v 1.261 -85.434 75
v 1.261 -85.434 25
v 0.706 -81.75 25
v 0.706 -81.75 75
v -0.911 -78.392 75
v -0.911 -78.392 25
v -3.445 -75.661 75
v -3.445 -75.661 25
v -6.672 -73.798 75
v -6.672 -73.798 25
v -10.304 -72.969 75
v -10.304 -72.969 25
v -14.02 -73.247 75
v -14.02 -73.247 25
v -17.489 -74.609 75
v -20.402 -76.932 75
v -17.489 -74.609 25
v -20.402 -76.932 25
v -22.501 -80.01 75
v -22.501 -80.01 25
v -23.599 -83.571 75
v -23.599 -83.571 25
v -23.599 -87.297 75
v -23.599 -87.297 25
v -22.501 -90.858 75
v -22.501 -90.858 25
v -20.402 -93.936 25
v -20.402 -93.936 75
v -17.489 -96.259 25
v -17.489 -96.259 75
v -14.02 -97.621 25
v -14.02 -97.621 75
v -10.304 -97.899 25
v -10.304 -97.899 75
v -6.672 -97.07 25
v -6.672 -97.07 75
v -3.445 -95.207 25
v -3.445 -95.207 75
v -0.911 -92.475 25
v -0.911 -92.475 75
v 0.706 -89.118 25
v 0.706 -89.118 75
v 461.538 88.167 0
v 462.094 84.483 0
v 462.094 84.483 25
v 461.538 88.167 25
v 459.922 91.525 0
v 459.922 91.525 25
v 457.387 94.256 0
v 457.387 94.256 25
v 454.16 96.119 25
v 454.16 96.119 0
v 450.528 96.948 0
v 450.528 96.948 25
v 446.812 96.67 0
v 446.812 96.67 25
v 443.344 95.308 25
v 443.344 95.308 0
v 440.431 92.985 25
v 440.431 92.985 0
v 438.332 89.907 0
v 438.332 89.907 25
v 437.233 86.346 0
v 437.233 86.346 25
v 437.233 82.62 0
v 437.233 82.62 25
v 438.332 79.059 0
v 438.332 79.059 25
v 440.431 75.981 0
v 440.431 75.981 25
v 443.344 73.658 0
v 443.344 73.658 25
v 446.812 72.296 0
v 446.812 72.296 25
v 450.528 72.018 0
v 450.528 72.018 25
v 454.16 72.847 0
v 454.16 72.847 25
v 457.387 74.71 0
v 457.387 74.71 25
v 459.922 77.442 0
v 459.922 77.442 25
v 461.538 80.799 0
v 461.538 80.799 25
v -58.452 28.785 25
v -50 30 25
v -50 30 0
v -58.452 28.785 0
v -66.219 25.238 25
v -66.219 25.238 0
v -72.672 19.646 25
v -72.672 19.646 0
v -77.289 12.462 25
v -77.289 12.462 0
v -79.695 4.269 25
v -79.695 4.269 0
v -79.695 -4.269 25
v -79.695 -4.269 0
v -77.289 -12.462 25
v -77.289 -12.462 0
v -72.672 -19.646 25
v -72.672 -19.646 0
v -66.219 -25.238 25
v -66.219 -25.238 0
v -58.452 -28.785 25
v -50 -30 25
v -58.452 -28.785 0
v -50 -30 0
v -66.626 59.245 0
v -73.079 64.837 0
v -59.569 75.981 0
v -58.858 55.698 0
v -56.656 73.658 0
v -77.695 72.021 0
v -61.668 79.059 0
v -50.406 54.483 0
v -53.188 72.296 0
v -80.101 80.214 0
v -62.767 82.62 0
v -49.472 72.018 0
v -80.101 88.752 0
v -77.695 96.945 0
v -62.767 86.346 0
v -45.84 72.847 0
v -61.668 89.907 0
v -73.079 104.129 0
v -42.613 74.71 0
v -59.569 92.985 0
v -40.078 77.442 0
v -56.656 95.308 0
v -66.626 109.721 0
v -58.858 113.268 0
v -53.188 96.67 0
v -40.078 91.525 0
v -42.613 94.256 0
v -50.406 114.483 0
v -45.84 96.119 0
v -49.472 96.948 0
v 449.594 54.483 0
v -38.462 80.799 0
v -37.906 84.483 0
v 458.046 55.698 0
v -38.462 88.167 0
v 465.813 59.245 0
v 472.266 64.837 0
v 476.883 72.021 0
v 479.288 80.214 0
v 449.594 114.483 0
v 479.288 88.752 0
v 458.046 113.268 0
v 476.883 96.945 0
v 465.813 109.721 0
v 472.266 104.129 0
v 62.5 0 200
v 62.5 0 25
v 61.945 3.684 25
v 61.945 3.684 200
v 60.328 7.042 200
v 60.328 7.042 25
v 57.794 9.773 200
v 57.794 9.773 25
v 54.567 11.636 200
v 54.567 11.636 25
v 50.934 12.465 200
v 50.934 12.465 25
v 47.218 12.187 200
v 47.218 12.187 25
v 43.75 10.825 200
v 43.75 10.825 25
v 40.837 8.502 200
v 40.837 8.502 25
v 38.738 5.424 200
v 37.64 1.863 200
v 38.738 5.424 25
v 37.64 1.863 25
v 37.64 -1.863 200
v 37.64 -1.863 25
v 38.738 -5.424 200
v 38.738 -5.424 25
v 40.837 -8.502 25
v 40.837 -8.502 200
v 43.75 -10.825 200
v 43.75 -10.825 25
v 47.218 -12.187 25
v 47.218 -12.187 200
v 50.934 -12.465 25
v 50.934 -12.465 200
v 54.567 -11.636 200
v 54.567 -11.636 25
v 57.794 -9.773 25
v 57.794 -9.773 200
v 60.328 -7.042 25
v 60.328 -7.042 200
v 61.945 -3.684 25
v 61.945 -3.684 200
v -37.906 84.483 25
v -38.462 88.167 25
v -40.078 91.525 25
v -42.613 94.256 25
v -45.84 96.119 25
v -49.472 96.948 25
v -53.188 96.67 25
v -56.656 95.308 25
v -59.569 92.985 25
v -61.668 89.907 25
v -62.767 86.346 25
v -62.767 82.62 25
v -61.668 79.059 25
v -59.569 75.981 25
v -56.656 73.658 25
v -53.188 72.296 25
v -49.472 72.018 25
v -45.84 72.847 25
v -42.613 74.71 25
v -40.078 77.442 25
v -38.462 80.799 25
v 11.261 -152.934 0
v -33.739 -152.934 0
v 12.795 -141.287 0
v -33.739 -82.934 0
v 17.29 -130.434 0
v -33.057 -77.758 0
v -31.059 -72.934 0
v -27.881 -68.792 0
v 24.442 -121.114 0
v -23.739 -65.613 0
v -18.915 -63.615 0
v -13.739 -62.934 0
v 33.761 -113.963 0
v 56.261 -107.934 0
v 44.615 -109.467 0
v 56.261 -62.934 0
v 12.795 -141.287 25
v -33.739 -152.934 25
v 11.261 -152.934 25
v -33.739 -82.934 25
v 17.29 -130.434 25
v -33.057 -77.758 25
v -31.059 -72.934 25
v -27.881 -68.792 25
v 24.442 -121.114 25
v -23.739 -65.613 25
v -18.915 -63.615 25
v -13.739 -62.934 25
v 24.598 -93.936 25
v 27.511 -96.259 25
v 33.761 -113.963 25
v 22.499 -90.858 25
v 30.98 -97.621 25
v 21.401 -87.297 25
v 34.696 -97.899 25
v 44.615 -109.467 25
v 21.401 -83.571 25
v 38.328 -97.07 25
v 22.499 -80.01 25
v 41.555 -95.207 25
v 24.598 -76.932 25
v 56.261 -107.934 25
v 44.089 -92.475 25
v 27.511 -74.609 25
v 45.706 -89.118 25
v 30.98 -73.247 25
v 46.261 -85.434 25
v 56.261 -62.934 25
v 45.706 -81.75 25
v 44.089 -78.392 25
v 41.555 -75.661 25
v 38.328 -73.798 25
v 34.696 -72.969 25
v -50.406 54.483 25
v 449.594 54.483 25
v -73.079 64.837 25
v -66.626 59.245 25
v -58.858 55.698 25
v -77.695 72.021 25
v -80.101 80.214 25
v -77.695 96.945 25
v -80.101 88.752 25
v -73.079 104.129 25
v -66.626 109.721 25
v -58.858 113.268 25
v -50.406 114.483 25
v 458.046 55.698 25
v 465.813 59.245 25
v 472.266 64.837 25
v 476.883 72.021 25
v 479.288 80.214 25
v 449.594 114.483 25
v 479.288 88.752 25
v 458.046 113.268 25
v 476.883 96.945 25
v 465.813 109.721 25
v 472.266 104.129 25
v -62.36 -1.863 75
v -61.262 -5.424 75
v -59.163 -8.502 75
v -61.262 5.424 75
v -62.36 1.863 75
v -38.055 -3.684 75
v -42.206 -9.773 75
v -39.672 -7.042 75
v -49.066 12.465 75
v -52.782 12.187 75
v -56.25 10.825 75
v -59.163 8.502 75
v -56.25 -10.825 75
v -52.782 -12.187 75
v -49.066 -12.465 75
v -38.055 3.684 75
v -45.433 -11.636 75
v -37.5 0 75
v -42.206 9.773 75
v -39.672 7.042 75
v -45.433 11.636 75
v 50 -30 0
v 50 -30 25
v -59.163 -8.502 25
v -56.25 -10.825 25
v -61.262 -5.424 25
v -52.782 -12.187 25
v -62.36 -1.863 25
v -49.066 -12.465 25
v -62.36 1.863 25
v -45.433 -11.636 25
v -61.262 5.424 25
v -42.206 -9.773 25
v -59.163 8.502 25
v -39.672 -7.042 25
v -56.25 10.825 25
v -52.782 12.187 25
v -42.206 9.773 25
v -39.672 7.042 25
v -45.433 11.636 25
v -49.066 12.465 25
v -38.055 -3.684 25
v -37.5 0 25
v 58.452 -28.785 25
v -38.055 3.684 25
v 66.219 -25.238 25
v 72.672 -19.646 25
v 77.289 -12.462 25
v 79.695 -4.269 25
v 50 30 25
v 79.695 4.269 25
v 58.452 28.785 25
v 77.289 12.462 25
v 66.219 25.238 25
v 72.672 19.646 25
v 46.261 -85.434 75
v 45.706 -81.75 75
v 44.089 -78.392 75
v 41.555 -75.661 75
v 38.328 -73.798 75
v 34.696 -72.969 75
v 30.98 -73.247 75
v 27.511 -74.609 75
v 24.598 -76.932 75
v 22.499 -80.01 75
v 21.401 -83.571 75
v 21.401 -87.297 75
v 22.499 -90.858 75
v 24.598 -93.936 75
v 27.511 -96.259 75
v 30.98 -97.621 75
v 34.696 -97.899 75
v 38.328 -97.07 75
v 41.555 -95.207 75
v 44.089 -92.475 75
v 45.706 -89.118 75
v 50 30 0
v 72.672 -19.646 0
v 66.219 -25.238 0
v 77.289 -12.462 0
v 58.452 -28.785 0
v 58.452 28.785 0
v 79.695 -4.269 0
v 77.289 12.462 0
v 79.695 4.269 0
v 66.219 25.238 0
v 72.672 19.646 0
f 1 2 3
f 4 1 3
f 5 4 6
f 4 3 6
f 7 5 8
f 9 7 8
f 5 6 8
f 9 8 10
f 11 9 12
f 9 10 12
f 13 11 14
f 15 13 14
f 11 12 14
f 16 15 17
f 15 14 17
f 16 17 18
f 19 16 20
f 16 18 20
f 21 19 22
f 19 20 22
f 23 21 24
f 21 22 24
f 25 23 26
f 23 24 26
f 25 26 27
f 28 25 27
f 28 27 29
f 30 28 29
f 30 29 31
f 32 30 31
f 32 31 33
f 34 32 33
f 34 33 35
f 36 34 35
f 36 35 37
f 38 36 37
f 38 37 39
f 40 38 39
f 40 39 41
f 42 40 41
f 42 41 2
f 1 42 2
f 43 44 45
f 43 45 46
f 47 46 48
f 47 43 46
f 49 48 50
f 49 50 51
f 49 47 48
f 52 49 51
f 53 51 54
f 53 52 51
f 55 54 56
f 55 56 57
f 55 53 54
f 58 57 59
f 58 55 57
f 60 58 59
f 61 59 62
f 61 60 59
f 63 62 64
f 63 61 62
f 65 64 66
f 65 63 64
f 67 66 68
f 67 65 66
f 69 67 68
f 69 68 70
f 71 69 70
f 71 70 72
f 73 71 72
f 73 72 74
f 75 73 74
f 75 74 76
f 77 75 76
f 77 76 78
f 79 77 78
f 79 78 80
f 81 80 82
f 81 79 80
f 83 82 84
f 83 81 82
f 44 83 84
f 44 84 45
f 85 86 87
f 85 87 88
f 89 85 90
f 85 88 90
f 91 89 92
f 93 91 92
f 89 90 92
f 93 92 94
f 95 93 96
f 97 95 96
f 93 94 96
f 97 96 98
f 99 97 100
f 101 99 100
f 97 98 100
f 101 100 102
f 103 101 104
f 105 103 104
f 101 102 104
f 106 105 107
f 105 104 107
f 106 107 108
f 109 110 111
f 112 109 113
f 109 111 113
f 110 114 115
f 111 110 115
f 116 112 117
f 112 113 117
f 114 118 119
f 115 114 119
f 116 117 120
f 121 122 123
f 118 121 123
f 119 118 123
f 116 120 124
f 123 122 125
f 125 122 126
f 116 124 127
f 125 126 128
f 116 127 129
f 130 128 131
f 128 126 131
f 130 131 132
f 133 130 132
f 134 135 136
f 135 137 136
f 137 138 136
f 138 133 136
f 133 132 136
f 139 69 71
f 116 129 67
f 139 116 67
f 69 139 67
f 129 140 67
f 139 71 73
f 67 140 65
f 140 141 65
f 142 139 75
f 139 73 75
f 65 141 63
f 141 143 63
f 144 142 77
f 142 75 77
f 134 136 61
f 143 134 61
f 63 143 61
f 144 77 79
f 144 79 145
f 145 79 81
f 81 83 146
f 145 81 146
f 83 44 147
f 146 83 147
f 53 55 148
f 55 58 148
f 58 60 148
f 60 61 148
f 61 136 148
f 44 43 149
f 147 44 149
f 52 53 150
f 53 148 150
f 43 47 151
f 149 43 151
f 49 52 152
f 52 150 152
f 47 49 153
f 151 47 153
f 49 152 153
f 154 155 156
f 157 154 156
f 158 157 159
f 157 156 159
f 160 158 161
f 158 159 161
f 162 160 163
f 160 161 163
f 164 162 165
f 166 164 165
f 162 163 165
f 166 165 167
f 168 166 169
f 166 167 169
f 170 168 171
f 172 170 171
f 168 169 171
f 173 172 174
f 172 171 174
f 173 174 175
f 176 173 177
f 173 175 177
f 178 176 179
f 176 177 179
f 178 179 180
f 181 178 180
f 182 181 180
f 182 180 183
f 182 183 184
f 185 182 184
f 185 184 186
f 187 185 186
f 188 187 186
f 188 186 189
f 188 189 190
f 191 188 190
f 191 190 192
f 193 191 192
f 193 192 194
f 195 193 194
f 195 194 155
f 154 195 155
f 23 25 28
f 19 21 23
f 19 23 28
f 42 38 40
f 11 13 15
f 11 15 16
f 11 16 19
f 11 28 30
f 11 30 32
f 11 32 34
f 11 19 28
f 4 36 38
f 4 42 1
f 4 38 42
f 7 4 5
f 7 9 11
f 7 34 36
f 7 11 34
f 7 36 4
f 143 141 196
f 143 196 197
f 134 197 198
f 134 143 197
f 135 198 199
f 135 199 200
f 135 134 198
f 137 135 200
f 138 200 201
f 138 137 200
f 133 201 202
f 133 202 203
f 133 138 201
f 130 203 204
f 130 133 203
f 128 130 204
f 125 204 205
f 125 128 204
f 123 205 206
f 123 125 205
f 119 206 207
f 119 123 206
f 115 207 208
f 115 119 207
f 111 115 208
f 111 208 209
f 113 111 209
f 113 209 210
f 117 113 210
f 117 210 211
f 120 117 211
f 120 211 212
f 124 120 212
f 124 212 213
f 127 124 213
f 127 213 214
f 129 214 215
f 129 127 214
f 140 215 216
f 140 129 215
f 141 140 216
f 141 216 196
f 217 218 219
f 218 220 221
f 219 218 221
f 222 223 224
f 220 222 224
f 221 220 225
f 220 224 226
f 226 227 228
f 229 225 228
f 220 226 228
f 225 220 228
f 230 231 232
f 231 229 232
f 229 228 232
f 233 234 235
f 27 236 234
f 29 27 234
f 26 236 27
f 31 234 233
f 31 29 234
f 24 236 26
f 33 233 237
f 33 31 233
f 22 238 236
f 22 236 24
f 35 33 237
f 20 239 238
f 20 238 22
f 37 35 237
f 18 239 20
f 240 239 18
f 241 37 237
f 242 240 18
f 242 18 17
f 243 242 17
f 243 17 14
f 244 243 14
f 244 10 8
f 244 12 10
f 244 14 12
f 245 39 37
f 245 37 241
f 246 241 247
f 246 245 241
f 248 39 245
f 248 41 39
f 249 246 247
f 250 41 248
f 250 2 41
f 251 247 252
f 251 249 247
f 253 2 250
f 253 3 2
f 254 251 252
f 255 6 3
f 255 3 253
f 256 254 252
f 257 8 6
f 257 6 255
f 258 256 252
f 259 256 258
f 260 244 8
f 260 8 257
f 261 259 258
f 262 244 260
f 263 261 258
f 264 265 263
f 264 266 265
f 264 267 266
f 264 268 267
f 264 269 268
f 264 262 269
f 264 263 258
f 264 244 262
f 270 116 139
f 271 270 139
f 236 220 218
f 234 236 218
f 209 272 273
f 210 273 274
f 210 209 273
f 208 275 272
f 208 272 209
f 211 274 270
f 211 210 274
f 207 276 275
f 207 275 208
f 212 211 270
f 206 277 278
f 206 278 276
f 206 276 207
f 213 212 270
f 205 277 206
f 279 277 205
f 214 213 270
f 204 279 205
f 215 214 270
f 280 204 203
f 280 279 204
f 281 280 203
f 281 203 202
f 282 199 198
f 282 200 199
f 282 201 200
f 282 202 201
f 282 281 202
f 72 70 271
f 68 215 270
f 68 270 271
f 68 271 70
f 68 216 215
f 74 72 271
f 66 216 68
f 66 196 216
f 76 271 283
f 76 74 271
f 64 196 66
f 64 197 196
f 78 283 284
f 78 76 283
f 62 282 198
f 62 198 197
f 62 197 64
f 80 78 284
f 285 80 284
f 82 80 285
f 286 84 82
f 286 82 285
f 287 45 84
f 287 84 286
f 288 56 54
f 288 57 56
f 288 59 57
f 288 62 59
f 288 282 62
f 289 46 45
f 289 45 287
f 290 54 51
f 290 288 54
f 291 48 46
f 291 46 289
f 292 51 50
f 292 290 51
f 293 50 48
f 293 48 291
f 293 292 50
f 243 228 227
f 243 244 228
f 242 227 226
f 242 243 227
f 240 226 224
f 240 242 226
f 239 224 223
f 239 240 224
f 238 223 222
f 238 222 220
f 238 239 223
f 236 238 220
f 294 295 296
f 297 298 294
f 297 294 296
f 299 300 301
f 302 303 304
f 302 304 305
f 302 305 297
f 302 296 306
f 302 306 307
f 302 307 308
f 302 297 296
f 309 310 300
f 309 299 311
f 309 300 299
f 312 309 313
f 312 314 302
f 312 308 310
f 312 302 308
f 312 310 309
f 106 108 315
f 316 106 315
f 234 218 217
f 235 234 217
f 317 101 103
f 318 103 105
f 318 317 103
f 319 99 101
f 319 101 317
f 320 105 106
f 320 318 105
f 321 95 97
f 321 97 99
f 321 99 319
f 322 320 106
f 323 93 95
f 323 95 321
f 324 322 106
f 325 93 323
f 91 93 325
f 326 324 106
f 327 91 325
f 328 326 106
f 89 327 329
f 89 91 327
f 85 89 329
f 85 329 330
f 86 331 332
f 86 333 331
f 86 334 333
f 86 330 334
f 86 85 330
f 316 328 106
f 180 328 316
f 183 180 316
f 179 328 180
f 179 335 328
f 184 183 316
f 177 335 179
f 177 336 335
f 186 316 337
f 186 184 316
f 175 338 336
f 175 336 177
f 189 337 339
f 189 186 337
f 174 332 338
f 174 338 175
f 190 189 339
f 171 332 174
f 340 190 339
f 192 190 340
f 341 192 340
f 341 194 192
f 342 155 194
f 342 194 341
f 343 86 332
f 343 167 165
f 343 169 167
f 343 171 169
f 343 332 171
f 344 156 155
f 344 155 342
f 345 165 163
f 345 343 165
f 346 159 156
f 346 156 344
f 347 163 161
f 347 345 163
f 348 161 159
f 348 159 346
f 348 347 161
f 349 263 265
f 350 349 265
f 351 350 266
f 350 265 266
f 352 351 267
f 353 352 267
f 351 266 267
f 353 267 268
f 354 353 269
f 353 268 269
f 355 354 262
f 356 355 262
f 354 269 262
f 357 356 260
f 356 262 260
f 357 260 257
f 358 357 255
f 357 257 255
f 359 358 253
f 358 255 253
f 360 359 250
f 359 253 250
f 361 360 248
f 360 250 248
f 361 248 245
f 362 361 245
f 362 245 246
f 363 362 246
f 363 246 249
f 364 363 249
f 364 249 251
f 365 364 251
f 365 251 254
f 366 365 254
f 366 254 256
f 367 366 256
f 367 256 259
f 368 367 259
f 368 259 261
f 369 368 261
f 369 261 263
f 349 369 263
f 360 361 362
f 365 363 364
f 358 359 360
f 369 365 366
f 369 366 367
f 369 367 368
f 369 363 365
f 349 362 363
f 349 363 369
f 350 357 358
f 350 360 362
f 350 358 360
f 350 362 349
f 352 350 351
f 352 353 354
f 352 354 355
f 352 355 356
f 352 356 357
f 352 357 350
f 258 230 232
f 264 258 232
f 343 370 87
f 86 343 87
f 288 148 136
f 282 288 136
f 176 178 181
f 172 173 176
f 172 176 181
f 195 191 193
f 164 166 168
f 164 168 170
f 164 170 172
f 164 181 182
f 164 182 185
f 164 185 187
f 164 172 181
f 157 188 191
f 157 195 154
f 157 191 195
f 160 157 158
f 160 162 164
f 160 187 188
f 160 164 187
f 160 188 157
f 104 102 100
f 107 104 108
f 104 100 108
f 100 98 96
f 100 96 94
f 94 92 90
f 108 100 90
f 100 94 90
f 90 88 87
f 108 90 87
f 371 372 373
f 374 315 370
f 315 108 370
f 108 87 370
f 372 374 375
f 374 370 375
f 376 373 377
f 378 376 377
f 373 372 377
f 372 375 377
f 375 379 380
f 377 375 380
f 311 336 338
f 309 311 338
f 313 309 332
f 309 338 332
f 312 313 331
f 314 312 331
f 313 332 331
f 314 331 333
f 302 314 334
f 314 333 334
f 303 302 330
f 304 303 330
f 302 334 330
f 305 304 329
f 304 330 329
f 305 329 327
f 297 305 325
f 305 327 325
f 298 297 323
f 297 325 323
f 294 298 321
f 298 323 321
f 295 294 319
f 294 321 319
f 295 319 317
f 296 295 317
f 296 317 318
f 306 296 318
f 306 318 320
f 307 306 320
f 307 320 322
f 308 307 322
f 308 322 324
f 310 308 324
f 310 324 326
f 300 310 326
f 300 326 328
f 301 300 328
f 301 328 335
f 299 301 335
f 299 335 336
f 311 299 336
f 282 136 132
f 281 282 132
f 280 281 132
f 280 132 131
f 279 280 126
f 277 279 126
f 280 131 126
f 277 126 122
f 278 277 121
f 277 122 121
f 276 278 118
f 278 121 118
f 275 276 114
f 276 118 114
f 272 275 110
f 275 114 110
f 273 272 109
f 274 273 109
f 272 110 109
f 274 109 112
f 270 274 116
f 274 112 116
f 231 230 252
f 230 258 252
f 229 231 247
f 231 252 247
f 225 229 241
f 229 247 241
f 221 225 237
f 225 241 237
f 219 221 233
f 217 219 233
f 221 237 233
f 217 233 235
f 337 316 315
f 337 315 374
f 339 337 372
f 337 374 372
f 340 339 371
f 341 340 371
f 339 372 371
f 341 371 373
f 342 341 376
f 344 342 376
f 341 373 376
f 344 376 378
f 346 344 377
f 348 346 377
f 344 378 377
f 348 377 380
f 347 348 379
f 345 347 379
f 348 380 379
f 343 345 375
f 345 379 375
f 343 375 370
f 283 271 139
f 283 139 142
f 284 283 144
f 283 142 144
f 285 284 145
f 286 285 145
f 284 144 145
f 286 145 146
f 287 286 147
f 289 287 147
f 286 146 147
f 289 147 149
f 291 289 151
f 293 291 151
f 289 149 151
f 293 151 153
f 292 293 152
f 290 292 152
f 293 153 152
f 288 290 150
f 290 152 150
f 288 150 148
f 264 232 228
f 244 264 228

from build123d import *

# Parameters (mm, degrees)
F0_R     = 12.5
F1_DEPTH = 25
F2_DEPTH = 200
F3_DEPTH = 75
F4_DEPTH = 25
F5_R     = 44.99999
F6_R     = 20
F7_DEPTH = 75
F8_DEPTH = 25


# Not quite as in the source:
# - a fillet or chamfer is up to 0.001 mm smaller than in the source, because OpenCascade refuses the exact size


with BuildPart() as f1:
    # F0 (on Top) → F1 (new body)
    with BuildSketch(Plane.XY):
        with BuildLine():
            ThreePointArc((50, -30), (80, 0), (50, 30))
            Line((50, 30), (-50, 30))
            ThreePointArc((-50, 30), (-80, 0), (-50, -30))
            Line((-50, -30), (50, -30))
        make_face()
        with Locations((-50, 0)):
            Circle(F0_R, mode=Mode.SUBTRACT)
        with Locations((50, 0)):
            Circle(F0_R, mode=Mode.SUBTRACT)
    extrude(amount=F1_DEPTH)

    # F0 (on Top) → F2 (join)
    with BuildSketch(Plane.XY):
        with Locations((50, 0)):
            Circle(F0_R)
    extrude(amount=F2_DEPTH)

    # F0 (on Top) → F3 (join)
    with BuildSketch(Plane.XY):
        with Locations((-50, 0)):
            Circle(F0_R)
    extrude(amount=F3_DEPTH)


with BuildPart() as f4:
    # F0 (on Top) → F4 (new body)
    with BuildSketch(Plane.XY):
        Polygon((56.2614613771, -107.9339570552), (56.2614613771, -62.9339570552), (-33.7385386229, -62.9339570552), (-33.7385386229, -152.9339570552), (11.2614613771, -152.9339570552), (11.2614613771, -107.9339570552), align=None)
        with Locations((-11.2385386229, -85.4339570552)):
            Circle(F0_R, mode=Mode.SUBTRACT)
        with Locations((33.7614613771, -85.4339570552)):
            Circle(F0_R, mode=Mode.SUBTRACT)
    extrude(amount=F4_DEPTH)

    # F5 (radius 45 in the source; OpenCascade refuses exactly that, so slightly less here)
    f5_edges = [f4.edges().sort_by_distance(p)[0] for p in [
        (11.261461, -107.933957, 12.5),
    ]]
    fillet(f5_edges, radius=F5_R)

    # F6
    f6_edges = [f4.edges().sort_by_distance(p)[0] for p in [
        (-33.738539, -62.933957, 12.5),
    ]]
    fillet(f6_edges, radius=F6_R)

    # F0 (on Top) → F7 (join)
    with BuildSketch(Plane.XY):
        with Locations((-11.2385386229, -85.4339570552)):
            Circle(F0_R)
        with Locations((33.7614613771, -85.4339570552)):
            Circle(F0_R)
    extrude(amount=F7_DEPTH)


with BuildPart() as f8:
    # F0 (on Top) → F8 (new body)
    with BuildSketch(Plane.XY):
        with BuildLine():
            ThreePointArc((449.5936667547, 54.4830423594), (479.5936667547, 84.4830423594), (449.5936667547, 114.4830423594))
            Line((449.5936667547, 114.4830423594), (-50.4063332453, 114.4830423594))
            ThreePointArc((-50.4063332453, 114.4830423594), (-80.4063332453, 84.4830423594), (-50.4063332453, 54.4830423594))
            Line((-50.4063332453, 54.4830423594), (449.5936667547, 54.4830423594))
        make_face()
        with Locations((-50.4063332453, 84.4830423594)):
            Circle(F0_R, mode=Mode.SUBTRACT)
        with Locations((449.5936667547, 84.4830423594)):
            Circle(F0_R, mode=Mode.SUBTRACT)
    extrude(amount=F8_DEPTH)


solid = Compound([f1.part, f4.part, f8.part])
